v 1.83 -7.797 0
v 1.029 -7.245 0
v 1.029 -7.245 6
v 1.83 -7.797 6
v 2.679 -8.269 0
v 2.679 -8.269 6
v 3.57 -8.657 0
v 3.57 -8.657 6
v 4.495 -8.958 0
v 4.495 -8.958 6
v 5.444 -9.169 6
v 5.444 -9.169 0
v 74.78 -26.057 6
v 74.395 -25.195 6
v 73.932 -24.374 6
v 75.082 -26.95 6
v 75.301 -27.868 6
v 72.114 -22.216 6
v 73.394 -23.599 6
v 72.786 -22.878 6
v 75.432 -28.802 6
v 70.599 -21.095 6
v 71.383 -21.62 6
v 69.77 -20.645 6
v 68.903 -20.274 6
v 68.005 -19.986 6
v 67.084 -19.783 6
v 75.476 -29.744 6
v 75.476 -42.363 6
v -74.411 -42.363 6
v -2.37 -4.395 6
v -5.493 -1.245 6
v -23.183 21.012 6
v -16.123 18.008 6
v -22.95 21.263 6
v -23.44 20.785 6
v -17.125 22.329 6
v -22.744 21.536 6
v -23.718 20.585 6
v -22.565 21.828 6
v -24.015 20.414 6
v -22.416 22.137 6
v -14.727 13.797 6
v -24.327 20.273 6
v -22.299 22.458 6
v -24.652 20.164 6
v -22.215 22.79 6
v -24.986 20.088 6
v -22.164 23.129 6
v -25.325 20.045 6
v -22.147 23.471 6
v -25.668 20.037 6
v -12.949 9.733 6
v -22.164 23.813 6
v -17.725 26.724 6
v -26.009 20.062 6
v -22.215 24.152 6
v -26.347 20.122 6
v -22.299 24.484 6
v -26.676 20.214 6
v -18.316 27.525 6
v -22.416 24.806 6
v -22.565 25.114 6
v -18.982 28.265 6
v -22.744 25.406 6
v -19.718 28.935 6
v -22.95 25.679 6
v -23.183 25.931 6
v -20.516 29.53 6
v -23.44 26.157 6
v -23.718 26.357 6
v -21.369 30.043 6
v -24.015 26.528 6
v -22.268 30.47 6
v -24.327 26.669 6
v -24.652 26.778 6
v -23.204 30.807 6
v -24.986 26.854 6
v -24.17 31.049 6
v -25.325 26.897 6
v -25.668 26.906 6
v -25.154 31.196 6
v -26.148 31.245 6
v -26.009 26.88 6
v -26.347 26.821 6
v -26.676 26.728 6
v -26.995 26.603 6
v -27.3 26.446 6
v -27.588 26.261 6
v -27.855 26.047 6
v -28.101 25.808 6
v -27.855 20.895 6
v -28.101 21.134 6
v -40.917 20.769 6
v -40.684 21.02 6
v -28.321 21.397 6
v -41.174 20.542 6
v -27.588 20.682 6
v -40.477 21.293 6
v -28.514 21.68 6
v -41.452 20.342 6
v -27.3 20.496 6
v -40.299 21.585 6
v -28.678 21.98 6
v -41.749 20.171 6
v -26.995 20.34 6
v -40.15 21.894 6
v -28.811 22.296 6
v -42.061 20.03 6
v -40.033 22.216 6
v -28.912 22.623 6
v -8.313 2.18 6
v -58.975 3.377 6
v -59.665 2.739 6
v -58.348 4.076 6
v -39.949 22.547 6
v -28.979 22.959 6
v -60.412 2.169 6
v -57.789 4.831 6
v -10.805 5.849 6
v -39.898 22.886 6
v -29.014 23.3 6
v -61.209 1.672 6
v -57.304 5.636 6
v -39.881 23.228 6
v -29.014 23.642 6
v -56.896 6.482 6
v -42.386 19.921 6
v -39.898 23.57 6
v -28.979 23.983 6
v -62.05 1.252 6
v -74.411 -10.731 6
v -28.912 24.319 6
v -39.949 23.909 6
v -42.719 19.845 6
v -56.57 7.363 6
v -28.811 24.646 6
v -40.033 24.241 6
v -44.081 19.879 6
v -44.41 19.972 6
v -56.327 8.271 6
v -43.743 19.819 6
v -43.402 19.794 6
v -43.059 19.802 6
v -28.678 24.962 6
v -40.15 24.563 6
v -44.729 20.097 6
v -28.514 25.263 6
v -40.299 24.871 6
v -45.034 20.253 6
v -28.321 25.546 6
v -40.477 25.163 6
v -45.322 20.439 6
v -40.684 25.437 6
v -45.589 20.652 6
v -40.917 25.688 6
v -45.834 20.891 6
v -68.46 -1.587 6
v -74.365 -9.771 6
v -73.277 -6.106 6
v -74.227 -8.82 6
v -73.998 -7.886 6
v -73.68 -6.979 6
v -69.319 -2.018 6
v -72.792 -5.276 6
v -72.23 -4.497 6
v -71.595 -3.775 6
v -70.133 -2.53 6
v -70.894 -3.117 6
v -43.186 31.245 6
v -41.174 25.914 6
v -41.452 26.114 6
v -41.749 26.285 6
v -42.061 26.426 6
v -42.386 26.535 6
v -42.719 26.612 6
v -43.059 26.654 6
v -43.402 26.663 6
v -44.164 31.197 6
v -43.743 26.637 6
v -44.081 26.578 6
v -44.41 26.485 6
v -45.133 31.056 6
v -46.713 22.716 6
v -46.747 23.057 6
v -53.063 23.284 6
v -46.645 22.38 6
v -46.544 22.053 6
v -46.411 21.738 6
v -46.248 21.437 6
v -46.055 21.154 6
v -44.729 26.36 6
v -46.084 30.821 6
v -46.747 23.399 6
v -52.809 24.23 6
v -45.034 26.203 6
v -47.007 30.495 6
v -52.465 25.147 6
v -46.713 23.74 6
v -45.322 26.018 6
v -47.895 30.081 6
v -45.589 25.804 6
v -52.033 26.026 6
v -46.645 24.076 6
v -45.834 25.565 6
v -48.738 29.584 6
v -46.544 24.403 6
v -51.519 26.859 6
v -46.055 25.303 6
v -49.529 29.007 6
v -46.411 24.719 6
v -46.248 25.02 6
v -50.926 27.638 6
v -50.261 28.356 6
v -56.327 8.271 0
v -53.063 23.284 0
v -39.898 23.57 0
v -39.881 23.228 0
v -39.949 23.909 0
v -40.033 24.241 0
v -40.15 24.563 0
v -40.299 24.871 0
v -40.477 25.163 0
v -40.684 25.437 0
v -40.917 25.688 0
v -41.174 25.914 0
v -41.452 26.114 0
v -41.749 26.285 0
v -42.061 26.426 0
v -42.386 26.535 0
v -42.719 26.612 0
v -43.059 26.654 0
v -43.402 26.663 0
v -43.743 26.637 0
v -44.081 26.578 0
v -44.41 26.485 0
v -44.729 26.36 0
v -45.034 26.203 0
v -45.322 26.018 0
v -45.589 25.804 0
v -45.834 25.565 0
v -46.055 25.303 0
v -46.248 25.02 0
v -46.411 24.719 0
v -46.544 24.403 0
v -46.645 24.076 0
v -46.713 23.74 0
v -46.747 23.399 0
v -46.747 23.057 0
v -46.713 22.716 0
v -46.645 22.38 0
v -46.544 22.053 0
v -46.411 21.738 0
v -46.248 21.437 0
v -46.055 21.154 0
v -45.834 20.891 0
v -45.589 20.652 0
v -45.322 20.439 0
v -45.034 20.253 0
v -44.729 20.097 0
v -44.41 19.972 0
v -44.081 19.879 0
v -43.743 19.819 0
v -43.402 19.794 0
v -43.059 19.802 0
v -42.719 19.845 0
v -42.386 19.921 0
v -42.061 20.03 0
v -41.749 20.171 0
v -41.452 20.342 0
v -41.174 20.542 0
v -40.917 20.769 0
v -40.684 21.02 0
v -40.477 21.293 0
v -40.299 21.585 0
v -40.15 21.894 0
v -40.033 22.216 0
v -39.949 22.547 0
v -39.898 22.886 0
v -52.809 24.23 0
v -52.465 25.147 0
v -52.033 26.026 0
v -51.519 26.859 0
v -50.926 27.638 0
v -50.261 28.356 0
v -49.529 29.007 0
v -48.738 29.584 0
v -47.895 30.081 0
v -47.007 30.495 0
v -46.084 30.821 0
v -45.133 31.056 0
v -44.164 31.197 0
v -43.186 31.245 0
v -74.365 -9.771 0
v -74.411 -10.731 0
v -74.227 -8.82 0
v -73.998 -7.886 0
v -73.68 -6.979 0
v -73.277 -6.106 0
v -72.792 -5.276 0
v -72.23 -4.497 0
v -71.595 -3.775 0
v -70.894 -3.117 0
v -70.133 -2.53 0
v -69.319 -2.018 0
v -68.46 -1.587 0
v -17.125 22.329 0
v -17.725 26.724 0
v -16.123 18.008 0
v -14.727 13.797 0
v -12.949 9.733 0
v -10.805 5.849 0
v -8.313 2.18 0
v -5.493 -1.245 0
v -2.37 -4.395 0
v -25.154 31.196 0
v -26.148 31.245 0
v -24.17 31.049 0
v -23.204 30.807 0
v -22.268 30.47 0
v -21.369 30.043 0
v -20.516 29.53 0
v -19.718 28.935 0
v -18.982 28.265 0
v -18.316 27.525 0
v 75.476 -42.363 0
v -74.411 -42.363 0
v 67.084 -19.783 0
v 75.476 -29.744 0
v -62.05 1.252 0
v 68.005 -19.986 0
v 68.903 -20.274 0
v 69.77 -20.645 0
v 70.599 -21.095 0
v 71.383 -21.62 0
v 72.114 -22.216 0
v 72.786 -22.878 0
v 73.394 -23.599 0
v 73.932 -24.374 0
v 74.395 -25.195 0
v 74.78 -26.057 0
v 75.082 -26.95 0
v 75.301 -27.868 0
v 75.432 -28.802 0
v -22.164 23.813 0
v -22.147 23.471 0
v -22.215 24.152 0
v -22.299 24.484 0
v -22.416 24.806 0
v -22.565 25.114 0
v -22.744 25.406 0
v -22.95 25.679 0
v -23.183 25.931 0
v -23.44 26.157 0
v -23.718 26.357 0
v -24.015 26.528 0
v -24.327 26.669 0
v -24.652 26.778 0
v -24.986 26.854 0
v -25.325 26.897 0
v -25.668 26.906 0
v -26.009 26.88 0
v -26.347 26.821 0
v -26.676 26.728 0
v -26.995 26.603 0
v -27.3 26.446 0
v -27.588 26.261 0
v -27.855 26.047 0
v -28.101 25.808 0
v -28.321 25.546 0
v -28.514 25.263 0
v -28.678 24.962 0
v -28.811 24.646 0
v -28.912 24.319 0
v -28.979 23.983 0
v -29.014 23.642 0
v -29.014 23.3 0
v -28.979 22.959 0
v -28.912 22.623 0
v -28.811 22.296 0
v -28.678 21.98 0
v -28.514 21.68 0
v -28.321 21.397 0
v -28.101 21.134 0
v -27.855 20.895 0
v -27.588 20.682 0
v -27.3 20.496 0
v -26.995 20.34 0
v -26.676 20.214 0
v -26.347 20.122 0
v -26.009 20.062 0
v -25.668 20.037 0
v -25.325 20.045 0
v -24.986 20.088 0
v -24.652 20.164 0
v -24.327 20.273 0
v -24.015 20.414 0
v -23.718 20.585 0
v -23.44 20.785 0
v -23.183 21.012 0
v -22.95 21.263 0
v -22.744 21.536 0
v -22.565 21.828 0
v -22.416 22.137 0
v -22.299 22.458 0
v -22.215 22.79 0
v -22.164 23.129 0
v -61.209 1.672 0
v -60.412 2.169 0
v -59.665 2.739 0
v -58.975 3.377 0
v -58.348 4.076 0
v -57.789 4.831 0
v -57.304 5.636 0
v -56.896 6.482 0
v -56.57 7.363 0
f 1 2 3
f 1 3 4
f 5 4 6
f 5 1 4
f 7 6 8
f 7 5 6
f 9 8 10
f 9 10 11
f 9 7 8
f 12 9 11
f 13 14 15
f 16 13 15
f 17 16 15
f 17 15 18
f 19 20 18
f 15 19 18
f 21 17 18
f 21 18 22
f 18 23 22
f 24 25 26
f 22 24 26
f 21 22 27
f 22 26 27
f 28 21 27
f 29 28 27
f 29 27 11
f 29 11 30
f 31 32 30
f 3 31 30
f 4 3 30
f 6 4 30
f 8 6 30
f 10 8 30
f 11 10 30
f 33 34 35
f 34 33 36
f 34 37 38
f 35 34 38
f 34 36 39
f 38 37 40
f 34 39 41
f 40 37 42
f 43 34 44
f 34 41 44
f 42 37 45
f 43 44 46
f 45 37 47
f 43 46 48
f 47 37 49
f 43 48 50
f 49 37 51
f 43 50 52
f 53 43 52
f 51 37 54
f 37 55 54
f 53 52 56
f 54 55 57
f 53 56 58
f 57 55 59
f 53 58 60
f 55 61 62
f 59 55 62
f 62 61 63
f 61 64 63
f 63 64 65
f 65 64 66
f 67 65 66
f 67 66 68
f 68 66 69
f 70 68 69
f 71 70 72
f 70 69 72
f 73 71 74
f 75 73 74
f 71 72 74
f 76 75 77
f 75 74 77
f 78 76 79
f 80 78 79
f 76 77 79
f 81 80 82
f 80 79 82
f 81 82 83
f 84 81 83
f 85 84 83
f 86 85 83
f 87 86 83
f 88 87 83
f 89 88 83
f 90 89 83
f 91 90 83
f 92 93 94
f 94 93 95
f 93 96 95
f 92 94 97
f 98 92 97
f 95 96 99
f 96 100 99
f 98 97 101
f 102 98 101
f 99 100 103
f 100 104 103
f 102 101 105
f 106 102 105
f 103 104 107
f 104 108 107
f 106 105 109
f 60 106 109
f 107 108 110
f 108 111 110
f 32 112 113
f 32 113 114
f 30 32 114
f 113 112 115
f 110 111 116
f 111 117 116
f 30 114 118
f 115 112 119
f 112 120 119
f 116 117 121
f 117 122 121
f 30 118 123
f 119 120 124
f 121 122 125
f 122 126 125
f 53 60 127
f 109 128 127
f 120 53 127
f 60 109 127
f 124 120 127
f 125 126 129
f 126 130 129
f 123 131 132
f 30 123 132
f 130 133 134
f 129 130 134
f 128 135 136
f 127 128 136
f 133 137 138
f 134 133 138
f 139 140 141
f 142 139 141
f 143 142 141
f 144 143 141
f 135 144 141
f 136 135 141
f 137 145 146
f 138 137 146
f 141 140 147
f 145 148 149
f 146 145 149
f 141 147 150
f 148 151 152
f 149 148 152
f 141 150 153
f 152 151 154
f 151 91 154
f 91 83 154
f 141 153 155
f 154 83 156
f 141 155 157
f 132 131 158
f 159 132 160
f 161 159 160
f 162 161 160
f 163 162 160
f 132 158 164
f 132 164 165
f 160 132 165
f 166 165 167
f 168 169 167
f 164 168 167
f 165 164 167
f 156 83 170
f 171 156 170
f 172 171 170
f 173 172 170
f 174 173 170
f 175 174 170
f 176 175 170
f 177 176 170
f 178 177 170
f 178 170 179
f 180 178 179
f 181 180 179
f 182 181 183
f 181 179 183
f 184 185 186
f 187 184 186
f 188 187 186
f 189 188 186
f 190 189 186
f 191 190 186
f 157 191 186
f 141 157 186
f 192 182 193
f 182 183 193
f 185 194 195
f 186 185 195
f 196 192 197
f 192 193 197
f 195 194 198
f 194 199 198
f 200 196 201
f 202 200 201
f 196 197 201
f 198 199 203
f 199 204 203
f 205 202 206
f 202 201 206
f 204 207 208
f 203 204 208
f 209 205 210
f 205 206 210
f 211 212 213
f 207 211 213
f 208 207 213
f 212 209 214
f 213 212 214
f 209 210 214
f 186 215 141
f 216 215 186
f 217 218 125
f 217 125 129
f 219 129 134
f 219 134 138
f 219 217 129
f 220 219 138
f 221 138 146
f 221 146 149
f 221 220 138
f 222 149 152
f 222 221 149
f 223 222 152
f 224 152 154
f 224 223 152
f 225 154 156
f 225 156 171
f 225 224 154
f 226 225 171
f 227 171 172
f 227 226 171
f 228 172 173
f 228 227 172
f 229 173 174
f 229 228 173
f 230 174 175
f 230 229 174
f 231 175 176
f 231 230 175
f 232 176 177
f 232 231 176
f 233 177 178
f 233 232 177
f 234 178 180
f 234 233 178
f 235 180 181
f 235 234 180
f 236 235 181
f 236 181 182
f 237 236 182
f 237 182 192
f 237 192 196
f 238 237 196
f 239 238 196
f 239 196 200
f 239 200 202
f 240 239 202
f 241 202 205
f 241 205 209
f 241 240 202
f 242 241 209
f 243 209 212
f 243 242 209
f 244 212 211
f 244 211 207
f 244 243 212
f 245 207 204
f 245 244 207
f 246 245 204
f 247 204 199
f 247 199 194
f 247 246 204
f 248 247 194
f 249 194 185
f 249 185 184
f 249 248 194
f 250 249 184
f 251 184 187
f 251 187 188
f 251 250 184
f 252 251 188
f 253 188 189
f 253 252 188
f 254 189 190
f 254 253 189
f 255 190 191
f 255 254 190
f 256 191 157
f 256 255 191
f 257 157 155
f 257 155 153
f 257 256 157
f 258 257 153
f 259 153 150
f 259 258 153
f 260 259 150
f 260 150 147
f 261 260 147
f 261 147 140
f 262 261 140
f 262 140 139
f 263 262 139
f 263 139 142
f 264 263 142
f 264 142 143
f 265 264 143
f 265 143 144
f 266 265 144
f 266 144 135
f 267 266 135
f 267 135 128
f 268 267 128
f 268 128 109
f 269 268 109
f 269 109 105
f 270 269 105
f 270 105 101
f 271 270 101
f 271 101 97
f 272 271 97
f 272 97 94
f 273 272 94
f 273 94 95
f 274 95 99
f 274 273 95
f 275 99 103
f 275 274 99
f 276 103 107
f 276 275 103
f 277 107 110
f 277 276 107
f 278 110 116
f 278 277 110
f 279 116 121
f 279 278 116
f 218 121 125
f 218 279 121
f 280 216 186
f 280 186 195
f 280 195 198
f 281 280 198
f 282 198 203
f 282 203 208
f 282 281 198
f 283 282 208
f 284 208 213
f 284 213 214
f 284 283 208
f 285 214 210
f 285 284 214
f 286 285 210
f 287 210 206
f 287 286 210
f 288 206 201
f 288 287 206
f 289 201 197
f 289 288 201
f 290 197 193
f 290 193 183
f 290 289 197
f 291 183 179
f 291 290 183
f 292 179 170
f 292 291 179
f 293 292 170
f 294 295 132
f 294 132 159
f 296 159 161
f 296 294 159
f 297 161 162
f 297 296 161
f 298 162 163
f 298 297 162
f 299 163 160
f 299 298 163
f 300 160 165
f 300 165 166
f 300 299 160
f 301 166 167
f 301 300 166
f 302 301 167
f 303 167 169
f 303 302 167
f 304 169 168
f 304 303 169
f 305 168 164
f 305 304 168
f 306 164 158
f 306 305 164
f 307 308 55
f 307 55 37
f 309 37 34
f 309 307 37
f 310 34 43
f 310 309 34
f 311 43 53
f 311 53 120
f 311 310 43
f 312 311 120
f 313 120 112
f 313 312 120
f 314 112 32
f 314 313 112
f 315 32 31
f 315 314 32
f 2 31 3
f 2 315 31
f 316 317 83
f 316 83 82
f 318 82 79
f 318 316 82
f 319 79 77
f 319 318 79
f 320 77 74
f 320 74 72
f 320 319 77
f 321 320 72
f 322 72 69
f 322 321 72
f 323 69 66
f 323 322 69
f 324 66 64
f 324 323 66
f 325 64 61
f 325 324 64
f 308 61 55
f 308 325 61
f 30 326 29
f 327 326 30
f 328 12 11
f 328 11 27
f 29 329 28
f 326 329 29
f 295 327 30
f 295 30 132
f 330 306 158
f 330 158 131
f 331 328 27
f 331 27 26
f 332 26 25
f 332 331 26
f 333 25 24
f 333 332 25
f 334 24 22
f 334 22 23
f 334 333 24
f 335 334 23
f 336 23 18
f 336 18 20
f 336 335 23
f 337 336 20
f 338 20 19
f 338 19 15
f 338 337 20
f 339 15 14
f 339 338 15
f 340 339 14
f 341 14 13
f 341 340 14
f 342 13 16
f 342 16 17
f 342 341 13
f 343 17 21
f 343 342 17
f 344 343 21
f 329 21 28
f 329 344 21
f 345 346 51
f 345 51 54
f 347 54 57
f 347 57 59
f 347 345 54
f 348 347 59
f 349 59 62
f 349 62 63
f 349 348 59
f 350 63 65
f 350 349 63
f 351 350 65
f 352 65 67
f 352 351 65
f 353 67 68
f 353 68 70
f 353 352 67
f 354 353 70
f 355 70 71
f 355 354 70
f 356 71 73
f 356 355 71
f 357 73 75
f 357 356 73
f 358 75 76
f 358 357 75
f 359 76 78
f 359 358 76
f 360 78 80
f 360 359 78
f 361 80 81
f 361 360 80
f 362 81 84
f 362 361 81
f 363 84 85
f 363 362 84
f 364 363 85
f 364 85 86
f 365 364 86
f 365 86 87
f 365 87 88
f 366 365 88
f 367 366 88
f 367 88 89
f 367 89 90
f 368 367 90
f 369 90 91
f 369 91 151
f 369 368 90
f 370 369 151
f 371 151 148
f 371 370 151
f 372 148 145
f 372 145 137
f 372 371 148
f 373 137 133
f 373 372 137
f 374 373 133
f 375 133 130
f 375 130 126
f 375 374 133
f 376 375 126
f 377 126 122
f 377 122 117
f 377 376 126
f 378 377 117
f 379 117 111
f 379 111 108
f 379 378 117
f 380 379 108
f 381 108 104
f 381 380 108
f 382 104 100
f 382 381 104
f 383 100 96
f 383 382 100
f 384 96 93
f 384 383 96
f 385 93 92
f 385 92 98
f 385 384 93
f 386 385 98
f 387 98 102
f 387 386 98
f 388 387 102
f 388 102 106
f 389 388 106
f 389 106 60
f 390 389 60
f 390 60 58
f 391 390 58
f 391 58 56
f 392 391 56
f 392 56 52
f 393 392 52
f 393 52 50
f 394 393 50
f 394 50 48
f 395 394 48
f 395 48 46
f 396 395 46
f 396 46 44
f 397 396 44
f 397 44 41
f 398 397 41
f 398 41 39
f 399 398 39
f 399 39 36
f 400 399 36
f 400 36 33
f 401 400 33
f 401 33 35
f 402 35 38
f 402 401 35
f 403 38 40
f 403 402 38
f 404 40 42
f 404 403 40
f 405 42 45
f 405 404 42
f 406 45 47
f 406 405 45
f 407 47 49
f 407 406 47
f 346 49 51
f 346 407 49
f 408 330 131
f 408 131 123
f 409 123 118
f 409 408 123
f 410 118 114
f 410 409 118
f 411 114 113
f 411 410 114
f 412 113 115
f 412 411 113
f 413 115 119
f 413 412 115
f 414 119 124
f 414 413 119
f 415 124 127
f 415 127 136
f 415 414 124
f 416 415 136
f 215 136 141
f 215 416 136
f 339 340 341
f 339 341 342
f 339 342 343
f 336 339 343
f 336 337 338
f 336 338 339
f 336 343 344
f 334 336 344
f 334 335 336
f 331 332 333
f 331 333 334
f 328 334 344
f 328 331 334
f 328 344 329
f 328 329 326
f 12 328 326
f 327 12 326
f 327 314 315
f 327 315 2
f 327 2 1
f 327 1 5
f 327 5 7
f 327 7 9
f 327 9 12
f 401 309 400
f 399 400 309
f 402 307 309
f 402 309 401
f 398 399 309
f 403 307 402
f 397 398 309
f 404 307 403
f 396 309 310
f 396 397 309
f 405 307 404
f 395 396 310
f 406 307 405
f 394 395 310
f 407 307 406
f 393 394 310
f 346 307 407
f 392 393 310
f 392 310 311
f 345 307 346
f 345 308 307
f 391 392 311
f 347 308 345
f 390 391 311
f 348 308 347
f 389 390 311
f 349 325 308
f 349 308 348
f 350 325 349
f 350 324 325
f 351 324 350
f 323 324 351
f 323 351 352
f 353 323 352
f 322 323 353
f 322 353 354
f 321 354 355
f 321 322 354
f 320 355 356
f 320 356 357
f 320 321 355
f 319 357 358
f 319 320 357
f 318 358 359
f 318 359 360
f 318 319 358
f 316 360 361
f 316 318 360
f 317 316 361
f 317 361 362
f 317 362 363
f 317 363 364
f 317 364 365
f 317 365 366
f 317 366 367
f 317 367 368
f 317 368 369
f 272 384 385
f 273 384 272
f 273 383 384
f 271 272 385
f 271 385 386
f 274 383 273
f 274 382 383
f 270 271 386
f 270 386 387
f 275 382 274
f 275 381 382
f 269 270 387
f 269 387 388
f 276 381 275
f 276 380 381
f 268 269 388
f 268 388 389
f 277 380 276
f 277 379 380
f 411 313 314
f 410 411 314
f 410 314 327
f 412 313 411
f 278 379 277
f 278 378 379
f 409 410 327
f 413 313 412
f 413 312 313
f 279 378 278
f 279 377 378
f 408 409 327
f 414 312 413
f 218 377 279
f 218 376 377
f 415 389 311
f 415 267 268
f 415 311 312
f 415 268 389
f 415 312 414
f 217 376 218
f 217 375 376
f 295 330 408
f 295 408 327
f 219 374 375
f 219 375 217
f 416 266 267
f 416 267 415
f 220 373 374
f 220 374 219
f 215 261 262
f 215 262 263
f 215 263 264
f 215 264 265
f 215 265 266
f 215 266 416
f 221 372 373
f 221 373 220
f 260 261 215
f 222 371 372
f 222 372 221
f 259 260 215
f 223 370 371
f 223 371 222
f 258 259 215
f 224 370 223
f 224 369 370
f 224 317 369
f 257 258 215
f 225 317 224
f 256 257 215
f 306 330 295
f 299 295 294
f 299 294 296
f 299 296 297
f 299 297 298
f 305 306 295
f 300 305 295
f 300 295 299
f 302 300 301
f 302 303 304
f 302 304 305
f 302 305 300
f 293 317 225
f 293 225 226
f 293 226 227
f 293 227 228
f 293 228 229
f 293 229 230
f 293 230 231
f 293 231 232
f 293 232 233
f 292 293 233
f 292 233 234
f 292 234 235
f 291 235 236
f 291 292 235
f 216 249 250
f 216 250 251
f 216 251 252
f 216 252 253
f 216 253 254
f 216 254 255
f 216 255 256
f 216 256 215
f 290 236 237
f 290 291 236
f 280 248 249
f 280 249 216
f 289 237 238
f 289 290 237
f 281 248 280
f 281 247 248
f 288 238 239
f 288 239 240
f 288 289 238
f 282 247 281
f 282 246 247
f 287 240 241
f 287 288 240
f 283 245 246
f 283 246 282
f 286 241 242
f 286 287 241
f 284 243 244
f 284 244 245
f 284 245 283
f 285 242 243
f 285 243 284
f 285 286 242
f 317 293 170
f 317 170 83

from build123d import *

# Parameters (mm, degrees)
CROQUIS2_R              = 3.435535485
SALIENTE_EXTRUIR1_DEPTH = 6


with BuildPart() as part:
    # Croquis2 → Saliente-Extruir1 (new body)
    with BuildSketch(Plane.XY):
        with BuildLine():
            Line((75.476244536, -42.362655144), (-74.410975533, -42.362655144))
            Line((-74.410975533, -42.362655144), (-74.410975533, -10.730962139))
            ThreePointArc((-74.410975533, -10.730962139), (-72.792282586, -5.276267639), (-68.460237116, -1.587468243))
            Line((-68.460237116, -1.587468243), (-62.049591399, 1.251532003))
            ThreePointArc((-62.049591399, 1.251532003), (-58.348209926, 4.076202257), (-56.327089342, 8.270729457))
            Line((-56.327089342, 8.270729457), (-53.063252273, 23.284379976))
            ThreePointArc((-53.063252273, 23.284379976), (-49.529087977, 29.006996787), (-43.186320825, 31.244845149))
            Line((-43.186320825, 31.244845149), (-26.148431061, 31.244845149))
            ThreePointArc((-26.148431061, 31.244845149), (-21.368566285, 30.043227891), (-17.725183812, 26.724078081))
            ThreePointArc((-17.725183812, 26.724078081), (-11.921972825, 7.766213541), (1.029468531, -7.245050647))
            ThreePointArc((1.029468531, -7.245050647), (3.120257187, -8.473650696), (5.443510228, -9.168884899))
            Line((5.443510228, -9.168884899), (67.083811667, -19.782734484))
            ThreePointArc((67.083811667, -19.782734484), (73.098451393, -23.231181656), (75.476244536, -29.743767833))
            Line((75.476244536, -29.743767833), (75.476244536, -42.362655144))
        make_face()
        with Locations((-25.582237715, 23.471115745)):
            Circle(CROQUIS2_R, mode=Mode.SUBTRACT)
        with Locations((-43.316057918, 23.228186701)):
            Circle(CROQUIS2_R, mode=Mode.SUBTRACT)
    extrude(amount=SALIENTE_EXTRUIR1_DEPTH)


solid = part.part
